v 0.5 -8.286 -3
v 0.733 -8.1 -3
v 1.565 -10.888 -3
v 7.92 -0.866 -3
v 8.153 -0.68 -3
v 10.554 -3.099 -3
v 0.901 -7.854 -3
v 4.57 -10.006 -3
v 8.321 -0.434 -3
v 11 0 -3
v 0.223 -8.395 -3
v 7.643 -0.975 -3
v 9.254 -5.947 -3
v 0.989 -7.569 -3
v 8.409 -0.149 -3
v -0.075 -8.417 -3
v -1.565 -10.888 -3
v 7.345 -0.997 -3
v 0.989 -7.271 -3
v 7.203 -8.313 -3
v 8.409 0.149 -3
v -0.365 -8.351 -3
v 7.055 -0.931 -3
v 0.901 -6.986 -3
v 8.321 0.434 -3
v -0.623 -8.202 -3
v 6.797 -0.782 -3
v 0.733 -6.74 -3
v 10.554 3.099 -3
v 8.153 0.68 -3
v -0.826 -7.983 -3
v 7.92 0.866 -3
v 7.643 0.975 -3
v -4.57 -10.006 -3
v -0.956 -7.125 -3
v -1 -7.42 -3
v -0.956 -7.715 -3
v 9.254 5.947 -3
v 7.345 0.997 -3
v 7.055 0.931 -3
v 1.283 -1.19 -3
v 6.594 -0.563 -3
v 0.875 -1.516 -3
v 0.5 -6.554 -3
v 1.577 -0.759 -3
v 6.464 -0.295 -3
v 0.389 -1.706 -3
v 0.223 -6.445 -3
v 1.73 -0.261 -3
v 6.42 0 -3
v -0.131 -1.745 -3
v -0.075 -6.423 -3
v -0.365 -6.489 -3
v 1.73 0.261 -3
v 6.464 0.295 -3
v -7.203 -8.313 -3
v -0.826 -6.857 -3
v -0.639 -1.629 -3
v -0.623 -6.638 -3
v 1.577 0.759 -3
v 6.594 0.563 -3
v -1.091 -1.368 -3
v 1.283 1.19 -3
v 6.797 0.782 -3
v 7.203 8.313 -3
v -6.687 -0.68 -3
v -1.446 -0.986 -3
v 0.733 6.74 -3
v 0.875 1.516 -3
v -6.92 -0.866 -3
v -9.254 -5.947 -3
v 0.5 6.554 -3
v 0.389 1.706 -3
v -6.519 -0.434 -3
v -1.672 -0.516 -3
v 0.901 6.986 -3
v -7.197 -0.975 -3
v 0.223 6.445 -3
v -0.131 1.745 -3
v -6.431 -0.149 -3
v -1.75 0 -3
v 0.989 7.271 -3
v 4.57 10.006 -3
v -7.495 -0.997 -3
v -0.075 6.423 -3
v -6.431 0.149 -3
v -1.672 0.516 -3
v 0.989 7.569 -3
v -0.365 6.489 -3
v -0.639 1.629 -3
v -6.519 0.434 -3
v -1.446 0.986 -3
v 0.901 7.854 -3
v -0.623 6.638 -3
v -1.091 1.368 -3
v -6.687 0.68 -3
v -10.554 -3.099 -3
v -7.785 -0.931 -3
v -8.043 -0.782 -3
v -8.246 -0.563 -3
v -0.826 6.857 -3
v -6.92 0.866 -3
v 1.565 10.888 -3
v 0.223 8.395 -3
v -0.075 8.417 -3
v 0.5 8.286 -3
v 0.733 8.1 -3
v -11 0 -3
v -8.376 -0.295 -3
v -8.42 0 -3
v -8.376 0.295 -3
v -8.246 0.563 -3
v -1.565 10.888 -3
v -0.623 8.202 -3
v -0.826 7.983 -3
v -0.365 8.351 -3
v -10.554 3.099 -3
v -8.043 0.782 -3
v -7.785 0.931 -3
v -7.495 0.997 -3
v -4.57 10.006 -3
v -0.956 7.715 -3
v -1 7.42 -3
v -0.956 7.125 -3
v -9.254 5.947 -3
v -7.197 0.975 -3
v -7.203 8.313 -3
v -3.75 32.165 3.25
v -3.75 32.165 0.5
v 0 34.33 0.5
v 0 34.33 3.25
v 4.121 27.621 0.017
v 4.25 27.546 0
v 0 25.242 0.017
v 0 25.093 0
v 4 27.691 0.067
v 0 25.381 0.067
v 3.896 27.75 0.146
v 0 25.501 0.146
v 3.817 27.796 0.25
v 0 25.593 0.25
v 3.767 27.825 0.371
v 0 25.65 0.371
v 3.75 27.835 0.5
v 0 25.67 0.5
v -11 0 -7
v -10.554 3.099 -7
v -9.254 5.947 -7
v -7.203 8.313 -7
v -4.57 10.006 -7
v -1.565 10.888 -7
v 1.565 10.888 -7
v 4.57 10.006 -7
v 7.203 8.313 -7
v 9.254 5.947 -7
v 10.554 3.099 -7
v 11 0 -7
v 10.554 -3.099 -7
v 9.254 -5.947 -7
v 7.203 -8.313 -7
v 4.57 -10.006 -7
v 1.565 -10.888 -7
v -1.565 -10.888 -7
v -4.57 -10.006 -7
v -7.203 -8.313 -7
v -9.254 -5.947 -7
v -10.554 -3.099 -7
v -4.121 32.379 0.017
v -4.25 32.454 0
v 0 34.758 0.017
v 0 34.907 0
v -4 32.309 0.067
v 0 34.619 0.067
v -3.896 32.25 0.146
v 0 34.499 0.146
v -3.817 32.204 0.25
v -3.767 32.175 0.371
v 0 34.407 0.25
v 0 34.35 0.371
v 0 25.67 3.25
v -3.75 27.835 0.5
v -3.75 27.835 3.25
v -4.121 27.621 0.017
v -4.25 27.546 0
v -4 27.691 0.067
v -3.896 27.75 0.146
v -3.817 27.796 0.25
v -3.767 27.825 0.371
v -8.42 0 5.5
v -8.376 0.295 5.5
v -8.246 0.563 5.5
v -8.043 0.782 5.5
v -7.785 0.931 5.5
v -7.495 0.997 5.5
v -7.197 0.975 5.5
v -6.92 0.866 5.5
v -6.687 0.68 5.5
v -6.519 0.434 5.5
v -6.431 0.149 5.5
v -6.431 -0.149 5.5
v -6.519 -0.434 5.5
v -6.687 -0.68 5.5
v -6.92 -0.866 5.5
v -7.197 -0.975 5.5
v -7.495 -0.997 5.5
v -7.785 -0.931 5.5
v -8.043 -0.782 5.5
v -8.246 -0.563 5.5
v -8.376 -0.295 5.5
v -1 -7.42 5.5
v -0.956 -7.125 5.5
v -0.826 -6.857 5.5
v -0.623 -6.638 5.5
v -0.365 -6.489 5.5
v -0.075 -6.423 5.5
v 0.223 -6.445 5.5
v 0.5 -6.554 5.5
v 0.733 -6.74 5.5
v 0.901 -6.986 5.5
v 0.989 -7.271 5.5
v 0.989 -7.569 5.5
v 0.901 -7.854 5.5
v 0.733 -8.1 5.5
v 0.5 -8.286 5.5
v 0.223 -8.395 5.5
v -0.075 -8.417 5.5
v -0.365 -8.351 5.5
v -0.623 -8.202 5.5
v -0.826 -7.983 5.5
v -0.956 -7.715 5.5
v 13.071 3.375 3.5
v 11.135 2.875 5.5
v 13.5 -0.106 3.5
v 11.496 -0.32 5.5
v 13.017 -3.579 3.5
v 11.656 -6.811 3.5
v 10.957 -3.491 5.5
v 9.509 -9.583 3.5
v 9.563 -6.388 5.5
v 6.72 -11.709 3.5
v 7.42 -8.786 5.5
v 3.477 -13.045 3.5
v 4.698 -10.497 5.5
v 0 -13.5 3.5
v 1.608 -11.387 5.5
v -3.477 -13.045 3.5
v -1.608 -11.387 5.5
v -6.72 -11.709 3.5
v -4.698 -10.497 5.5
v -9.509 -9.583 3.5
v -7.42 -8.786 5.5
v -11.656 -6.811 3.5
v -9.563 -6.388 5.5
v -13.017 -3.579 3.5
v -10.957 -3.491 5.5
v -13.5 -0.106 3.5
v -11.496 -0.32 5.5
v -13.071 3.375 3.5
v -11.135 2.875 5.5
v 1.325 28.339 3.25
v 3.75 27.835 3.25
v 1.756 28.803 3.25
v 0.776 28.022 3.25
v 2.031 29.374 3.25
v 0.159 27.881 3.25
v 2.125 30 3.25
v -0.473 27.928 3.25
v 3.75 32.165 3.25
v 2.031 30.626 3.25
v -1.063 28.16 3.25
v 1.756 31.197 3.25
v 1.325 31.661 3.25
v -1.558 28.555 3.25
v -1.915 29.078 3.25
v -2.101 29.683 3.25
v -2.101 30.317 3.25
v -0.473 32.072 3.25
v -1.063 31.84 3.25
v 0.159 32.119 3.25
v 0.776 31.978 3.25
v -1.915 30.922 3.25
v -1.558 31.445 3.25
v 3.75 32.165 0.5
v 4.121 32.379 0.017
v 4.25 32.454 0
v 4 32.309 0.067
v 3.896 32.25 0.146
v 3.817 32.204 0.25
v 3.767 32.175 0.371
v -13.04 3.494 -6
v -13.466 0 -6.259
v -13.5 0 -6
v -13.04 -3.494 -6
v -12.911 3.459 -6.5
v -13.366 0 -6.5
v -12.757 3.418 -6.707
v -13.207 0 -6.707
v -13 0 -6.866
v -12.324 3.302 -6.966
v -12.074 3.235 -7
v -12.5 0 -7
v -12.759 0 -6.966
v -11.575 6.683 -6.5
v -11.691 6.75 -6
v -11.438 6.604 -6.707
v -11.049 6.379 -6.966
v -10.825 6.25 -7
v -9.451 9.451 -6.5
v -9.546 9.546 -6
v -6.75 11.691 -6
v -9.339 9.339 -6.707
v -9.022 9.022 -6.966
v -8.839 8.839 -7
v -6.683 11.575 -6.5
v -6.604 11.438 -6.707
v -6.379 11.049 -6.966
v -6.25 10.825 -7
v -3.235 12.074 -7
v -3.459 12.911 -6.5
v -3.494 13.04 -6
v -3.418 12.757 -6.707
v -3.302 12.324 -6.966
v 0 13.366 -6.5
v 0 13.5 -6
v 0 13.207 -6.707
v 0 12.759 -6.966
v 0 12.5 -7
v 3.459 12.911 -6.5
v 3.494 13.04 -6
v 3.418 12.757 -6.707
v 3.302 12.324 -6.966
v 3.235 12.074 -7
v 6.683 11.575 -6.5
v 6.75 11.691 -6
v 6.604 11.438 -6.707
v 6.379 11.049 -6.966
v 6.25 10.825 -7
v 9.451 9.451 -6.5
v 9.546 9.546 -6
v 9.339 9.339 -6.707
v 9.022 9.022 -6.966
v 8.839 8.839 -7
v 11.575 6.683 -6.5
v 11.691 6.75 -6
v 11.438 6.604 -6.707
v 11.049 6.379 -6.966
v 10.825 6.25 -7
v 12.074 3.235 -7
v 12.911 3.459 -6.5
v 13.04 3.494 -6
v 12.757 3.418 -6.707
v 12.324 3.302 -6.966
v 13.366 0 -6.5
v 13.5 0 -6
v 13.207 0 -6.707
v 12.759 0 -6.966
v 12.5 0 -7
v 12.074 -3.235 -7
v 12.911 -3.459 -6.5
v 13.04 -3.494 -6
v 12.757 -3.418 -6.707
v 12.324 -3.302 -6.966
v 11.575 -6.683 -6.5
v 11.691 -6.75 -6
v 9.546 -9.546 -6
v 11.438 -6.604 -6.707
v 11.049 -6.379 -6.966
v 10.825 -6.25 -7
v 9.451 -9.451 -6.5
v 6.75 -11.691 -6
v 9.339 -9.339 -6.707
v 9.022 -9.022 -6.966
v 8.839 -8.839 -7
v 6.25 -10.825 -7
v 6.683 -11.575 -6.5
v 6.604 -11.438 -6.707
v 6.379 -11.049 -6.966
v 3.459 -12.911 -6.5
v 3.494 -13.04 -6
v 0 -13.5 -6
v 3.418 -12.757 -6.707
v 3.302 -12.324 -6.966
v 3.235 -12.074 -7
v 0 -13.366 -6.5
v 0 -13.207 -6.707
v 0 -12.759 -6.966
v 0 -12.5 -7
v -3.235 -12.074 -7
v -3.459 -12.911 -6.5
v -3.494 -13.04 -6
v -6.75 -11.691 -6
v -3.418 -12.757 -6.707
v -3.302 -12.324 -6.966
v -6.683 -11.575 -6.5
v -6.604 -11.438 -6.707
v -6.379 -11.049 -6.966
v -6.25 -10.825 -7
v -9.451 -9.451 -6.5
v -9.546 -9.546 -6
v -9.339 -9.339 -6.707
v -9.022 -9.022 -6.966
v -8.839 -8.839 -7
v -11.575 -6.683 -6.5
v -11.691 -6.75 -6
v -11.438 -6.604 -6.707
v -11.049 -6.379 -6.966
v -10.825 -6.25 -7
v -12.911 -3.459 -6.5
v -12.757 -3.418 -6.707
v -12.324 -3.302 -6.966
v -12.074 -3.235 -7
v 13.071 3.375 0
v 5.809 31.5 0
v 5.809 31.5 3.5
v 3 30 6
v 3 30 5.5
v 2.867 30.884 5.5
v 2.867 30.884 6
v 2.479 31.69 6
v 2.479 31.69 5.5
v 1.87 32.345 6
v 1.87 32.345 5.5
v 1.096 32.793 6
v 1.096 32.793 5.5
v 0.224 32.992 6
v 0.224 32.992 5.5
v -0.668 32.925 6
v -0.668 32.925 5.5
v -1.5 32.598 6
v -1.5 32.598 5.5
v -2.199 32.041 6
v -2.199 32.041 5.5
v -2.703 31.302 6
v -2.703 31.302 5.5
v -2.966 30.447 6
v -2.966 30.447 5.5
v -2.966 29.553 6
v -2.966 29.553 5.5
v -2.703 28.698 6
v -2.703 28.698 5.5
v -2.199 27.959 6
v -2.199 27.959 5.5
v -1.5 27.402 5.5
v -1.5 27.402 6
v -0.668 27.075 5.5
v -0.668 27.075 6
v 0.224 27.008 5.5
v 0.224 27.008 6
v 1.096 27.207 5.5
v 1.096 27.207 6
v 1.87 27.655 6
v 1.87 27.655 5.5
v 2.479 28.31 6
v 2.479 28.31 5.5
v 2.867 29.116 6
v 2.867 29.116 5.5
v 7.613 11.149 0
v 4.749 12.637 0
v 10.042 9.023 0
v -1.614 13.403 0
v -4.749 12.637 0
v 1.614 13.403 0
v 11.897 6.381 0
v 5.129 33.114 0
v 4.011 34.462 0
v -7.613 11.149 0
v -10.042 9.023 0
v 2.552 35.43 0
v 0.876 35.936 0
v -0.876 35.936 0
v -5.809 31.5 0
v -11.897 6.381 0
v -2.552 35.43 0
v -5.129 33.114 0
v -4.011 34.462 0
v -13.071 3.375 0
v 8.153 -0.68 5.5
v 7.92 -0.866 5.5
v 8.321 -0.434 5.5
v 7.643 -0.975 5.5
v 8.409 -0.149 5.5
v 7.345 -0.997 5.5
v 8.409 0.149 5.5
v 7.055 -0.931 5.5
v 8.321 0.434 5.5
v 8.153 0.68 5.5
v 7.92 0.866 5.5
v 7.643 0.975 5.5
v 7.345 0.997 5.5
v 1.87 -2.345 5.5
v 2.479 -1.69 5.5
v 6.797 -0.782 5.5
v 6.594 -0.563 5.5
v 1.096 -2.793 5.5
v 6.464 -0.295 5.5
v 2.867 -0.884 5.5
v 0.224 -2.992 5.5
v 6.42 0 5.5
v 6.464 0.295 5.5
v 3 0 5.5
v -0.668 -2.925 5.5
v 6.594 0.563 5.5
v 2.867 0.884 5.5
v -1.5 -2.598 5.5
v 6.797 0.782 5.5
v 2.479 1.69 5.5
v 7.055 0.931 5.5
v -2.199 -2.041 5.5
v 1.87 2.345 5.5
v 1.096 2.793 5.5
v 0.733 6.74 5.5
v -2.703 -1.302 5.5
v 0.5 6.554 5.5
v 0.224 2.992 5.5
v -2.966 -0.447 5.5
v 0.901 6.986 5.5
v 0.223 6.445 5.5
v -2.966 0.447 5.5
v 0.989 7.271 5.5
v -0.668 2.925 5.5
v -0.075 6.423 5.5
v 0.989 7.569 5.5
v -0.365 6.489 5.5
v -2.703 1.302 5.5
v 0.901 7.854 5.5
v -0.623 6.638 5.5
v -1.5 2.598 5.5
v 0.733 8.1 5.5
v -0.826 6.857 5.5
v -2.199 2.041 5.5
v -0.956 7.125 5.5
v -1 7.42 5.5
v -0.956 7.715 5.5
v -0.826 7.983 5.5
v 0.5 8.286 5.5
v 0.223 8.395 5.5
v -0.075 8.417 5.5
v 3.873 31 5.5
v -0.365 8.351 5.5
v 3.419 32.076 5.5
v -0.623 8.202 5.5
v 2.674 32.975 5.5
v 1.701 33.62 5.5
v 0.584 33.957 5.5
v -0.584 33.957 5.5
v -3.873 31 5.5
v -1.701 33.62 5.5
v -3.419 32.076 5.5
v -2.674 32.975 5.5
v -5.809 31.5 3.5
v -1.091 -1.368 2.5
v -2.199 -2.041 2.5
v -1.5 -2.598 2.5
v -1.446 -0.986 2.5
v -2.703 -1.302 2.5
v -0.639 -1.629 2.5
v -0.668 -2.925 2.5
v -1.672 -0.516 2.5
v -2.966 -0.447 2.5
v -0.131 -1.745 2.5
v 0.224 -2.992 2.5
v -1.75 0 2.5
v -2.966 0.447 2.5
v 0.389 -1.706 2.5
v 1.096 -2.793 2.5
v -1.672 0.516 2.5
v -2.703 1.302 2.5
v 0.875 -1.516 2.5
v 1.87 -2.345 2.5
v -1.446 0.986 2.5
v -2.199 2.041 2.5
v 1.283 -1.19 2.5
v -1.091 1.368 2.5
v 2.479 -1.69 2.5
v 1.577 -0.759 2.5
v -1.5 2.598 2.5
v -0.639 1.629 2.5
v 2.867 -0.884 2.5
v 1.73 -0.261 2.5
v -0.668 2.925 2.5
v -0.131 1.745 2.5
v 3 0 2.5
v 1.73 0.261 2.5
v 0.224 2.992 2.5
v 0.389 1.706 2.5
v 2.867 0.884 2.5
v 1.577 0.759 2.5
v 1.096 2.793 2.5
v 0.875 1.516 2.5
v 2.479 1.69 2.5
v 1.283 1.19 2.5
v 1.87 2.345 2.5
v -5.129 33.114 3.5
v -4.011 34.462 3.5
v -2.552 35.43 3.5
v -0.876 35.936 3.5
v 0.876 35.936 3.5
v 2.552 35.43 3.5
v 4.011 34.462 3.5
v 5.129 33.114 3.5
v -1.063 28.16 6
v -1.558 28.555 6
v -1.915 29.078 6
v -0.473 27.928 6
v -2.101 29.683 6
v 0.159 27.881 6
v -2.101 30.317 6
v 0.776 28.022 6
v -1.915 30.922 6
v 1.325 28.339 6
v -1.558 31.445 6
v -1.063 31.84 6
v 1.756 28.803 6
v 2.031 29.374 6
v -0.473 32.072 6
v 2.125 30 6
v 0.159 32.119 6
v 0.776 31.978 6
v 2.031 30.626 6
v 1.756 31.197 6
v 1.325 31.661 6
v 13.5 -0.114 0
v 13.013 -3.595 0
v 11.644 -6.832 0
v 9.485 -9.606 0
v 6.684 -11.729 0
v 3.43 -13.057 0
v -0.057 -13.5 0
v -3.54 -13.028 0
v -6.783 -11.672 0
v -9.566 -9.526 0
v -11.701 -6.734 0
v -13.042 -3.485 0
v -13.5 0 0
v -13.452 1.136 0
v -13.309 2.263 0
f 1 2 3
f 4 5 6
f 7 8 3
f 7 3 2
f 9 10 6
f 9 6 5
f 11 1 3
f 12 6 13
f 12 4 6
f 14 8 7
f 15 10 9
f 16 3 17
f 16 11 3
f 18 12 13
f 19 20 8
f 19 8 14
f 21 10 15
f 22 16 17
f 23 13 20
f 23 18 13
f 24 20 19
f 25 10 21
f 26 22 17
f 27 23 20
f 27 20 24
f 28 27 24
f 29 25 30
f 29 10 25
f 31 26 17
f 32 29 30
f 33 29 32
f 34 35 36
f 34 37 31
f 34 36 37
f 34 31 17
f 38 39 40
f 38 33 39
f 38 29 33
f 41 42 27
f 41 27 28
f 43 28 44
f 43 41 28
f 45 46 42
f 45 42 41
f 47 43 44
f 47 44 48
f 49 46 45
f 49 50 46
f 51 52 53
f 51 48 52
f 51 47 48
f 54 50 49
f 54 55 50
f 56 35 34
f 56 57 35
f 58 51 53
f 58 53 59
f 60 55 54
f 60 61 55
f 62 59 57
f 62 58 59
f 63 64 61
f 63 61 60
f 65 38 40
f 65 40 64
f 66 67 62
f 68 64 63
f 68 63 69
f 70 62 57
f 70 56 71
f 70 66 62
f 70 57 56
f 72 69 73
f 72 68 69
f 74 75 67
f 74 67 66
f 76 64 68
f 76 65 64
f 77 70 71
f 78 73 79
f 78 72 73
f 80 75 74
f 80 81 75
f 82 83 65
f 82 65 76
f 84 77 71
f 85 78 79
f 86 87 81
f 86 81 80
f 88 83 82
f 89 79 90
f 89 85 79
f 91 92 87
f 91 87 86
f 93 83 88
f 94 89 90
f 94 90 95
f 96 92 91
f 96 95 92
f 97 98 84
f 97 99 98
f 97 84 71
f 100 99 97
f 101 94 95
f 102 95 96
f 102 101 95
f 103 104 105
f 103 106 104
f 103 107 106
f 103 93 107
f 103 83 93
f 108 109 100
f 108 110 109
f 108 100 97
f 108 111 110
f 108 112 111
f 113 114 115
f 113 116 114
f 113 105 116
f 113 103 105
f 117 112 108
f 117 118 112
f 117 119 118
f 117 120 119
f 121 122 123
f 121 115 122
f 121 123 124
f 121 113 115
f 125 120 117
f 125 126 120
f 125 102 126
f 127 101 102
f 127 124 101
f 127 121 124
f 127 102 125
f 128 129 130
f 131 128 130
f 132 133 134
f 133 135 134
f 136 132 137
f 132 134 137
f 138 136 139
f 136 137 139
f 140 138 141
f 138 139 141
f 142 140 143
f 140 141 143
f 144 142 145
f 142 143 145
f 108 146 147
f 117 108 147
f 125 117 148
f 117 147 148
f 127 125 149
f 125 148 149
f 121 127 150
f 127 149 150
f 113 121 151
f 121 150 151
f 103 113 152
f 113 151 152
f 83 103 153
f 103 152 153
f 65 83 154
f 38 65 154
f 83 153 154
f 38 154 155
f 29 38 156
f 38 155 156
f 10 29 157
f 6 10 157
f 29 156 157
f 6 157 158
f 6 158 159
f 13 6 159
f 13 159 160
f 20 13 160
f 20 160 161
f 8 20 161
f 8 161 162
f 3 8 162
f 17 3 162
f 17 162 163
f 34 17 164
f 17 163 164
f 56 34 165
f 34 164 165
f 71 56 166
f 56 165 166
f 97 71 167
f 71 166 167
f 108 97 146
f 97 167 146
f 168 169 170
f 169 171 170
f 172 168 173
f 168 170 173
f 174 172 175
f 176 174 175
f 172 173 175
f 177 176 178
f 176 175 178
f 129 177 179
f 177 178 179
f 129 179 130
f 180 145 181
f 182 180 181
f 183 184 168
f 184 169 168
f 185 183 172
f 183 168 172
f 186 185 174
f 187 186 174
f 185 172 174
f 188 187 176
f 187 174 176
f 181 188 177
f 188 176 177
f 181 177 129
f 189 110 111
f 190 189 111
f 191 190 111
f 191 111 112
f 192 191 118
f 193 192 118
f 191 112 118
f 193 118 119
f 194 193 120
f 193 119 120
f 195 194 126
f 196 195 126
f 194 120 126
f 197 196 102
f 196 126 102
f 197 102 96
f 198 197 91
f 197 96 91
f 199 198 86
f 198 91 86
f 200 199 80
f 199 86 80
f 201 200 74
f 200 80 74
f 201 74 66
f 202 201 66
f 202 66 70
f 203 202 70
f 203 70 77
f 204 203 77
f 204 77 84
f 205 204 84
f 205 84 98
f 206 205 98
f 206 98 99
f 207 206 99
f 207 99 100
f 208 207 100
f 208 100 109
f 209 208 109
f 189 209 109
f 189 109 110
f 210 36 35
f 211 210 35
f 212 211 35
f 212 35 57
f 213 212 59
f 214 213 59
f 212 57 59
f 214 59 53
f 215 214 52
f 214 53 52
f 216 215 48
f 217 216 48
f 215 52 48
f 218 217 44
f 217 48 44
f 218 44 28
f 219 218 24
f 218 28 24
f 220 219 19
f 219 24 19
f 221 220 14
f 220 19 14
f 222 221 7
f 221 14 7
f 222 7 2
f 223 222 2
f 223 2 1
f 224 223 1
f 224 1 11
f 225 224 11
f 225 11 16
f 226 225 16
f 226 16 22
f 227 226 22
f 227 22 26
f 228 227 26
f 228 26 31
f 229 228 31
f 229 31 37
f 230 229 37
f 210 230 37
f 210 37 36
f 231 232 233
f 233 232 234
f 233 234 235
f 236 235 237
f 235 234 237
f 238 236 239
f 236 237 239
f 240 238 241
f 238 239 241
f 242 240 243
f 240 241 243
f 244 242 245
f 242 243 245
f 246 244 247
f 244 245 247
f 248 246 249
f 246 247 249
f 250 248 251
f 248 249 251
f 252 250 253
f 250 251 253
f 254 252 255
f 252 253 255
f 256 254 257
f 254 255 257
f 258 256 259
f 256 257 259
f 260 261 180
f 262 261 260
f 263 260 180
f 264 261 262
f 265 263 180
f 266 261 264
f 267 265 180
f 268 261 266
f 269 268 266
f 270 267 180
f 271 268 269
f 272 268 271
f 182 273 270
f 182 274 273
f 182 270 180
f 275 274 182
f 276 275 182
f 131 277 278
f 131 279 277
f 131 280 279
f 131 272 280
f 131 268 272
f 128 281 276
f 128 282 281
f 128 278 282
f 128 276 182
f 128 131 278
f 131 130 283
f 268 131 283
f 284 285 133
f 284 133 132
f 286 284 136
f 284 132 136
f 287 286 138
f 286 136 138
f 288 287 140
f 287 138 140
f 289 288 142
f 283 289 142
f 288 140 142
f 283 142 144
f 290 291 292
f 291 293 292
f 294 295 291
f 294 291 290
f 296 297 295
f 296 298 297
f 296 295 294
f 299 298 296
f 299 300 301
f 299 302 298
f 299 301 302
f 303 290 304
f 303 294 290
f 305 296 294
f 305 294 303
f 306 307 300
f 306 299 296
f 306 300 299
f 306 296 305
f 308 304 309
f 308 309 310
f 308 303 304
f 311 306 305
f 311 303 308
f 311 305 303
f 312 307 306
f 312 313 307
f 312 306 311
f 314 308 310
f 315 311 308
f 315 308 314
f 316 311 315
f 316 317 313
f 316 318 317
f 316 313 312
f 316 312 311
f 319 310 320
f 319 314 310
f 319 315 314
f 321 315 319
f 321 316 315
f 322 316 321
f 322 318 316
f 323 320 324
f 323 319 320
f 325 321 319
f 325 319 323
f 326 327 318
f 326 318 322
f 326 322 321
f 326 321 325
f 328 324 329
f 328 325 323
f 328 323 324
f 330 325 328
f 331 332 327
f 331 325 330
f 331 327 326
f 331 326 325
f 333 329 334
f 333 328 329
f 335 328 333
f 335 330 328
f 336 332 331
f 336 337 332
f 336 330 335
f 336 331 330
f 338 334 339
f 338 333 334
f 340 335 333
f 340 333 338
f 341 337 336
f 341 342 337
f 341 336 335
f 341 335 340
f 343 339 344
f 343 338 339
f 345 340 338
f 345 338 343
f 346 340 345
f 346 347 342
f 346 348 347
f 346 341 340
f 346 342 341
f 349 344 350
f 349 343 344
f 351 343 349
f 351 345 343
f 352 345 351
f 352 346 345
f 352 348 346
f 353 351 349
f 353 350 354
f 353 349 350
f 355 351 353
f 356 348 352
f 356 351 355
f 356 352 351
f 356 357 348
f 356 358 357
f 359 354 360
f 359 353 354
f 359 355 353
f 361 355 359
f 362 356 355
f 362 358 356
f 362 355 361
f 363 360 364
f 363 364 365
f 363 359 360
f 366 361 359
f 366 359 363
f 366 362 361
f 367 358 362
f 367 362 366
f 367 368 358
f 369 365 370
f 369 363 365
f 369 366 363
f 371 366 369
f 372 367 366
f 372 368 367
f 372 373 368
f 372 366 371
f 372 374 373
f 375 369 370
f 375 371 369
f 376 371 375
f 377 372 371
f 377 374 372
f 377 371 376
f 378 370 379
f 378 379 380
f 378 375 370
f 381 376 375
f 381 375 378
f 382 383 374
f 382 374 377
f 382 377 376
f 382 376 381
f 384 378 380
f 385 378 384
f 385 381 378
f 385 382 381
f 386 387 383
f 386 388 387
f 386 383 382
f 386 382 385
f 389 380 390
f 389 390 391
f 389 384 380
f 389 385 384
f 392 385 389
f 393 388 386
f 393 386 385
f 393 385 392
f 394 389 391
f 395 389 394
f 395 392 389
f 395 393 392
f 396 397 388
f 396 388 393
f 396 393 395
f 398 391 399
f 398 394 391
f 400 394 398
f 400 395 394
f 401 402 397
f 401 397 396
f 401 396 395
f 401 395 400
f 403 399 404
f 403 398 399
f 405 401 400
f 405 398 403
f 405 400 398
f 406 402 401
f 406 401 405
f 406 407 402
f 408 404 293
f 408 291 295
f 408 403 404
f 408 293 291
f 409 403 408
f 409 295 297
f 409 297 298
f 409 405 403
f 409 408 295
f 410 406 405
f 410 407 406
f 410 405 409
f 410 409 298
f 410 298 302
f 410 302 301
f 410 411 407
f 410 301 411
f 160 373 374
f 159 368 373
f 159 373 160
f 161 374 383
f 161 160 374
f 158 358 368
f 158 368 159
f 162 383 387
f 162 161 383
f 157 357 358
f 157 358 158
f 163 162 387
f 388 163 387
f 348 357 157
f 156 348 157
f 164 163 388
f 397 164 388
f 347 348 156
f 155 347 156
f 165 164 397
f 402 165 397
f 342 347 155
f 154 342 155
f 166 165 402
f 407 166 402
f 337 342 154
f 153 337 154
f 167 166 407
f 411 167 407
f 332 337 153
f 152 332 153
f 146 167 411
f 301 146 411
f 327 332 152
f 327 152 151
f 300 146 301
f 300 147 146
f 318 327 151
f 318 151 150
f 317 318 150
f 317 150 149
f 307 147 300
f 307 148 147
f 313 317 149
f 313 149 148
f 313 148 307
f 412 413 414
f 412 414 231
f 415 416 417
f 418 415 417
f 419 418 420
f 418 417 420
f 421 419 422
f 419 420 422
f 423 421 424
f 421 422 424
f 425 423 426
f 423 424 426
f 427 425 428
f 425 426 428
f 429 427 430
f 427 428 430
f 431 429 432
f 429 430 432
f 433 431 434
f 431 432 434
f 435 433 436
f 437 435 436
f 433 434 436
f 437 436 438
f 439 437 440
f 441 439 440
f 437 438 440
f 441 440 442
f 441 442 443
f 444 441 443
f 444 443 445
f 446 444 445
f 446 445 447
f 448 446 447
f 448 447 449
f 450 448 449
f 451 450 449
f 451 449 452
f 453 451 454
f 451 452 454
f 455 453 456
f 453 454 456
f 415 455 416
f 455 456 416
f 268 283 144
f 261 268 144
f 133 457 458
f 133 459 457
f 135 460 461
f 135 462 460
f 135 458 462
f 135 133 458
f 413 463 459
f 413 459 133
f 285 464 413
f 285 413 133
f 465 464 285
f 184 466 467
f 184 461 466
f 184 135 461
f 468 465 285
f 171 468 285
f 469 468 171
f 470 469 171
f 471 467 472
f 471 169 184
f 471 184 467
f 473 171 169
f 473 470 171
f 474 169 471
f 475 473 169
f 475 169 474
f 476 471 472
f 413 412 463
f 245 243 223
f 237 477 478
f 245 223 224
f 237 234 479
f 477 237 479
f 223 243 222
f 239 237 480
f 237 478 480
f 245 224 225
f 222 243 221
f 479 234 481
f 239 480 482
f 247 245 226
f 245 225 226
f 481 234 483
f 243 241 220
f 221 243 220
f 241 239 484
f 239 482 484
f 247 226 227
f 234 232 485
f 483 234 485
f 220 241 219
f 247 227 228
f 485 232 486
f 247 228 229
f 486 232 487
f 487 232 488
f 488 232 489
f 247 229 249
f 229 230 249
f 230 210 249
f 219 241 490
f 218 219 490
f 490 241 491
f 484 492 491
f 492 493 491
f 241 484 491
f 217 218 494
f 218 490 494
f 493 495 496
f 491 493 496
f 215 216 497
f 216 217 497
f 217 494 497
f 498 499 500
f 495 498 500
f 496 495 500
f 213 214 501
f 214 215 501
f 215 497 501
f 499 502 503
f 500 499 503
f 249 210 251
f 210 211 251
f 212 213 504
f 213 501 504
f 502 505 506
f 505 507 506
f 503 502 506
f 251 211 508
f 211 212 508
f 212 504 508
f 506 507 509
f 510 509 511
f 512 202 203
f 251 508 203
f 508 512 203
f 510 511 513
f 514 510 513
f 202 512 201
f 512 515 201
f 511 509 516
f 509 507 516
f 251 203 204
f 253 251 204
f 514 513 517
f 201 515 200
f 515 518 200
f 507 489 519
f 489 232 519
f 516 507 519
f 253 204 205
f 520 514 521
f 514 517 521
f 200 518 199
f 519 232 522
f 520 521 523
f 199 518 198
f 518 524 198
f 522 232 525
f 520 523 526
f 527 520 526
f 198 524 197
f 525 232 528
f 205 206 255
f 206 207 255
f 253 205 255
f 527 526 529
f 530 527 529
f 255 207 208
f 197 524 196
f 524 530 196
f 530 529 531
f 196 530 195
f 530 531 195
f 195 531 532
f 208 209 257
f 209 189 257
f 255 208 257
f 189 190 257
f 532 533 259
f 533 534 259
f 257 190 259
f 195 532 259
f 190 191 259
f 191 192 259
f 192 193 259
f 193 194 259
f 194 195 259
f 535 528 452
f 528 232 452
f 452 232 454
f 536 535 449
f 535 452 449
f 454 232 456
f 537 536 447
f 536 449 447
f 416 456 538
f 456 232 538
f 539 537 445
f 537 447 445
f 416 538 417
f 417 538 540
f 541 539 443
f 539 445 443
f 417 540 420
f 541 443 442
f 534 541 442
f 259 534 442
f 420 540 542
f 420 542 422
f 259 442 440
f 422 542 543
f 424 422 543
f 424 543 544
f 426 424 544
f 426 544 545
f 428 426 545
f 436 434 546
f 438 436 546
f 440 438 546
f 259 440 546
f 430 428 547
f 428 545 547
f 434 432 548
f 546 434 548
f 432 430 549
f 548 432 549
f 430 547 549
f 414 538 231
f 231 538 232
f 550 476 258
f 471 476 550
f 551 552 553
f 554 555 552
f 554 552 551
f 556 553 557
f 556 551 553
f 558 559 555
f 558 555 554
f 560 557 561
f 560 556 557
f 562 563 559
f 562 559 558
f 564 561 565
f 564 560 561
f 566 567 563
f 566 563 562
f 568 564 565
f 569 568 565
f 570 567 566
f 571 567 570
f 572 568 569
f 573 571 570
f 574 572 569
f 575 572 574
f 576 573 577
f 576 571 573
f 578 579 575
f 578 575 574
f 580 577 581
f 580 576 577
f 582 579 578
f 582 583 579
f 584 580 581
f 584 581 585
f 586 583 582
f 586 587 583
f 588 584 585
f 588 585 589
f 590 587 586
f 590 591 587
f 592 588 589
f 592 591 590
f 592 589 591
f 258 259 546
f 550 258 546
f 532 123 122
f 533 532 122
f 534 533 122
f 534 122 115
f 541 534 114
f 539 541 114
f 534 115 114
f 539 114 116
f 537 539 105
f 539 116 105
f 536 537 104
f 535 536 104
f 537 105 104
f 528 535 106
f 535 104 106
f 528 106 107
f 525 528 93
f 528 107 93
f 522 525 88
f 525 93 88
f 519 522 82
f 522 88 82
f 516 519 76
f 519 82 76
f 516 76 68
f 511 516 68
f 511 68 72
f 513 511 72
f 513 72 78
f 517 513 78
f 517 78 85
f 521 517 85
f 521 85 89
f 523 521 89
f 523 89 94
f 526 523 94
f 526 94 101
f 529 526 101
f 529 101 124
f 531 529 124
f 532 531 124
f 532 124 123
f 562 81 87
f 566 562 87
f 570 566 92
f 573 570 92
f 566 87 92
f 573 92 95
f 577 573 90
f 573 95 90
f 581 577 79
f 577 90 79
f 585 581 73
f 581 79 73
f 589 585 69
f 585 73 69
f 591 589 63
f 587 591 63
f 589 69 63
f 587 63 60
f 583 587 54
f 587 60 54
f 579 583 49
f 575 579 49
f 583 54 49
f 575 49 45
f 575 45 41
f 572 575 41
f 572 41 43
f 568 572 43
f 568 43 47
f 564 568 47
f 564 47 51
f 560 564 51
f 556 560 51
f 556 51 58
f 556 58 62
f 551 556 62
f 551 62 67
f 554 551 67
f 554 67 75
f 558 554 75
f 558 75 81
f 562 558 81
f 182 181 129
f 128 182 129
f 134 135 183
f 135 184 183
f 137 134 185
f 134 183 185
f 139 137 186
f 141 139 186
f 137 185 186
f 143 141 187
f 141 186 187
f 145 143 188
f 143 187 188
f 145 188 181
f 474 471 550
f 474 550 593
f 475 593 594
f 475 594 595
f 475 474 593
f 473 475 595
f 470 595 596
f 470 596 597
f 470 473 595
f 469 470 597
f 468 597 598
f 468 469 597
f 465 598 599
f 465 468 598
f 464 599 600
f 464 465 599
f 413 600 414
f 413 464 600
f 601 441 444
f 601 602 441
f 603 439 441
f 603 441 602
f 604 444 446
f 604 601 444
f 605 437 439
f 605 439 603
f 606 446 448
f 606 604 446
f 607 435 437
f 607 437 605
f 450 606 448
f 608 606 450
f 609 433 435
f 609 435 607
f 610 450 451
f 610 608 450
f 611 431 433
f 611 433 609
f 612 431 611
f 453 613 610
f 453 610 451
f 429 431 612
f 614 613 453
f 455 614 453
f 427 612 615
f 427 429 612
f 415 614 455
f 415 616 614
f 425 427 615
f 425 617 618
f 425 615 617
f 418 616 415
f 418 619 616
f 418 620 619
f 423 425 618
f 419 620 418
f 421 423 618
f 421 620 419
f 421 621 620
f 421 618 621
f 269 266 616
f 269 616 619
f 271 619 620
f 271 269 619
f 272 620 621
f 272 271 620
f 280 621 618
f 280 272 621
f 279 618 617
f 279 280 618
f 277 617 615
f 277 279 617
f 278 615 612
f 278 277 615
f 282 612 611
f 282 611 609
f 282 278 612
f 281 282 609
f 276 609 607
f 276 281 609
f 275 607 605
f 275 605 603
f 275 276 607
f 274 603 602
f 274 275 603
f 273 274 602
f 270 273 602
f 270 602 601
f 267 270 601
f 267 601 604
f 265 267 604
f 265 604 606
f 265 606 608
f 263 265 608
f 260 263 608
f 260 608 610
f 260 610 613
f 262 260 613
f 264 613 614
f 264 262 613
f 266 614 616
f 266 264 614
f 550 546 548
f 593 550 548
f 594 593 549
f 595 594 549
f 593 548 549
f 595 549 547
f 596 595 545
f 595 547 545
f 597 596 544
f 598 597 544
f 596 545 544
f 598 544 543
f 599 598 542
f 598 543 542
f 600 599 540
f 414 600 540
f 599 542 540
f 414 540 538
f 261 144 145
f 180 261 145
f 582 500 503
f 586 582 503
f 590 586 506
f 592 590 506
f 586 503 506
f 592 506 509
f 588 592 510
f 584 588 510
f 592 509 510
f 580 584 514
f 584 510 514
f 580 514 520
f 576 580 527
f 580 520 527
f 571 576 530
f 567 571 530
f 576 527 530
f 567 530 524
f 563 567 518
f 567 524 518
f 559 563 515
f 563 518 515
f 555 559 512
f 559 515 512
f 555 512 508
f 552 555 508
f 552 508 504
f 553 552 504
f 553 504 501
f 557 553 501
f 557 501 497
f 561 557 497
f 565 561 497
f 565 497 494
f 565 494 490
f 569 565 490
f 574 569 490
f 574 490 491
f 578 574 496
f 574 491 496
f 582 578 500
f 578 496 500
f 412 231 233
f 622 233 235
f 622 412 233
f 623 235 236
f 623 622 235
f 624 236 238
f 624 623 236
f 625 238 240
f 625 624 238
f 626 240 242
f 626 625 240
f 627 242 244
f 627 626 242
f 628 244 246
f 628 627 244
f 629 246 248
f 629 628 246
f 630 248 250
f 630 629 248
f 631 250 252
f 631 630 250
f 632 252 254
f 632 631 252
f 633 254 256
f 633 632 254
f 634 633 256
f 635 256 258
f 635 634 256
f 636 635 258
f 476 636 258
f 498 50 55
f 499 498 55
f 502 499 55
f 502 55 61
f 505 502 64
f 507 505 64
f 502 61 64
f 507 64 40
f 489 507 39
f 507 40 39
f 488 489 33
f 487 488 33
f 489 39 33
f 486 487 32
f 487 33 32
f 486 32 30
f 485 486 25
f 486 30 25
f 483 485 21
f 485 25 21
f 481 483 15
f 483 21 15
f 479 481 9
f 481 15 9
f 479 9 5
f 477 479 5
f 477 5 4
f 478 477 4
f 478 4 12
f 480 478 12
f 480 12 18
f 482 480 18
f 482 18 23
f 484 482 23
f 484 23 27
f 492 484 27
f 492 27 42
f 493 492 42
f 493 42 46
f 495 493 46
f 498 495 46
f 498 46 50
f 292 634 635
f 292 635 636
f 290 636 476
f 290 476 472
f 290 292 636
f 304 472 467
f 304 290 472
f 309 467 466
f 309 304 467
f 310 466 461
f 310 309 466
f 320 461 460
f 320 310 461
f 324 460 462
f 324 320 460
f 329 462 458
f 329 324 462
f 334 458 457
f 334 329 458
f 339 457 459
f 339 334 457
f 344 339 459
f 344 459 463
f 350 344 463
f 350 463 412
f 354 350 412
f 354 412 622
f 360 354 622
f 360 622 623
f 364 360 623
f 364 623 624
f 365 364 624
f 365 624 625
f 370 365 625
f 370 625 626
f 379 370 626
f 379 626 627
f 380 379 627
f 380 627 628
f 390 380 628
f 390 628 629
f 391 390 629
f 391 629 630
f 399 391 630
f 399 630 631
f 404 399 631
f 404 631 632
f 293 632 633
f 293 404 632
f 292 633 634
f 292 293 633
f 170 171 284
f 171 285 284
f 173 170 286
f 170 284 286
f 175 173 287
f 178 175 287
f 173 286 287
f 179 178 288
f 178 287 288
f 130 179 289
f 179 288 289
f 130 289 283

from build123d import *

# Parameters (mm, degrees)
SKETCH1_R           = 2.125
BOSS_EXTRUDE1_DEPTH = 5.5
BOSS_EXTRUDE2_START = 7
SKETCH4_R           = 13.5
BOSS_EXTRUDE2_DEPTH = 7
SKETCH6_R           = 11
CUT_EXTRUDE4_DEPTH  = 4
SKETCH5_R           = 1
SKETCH5_R_2         = 1.75
CUT_EXTRUDE2_DEPTH  = 40.376388864
CHAMFER1_SIZE       = 2
SKETCH7_R           = 3
CUT_EXTRUDE5_DEPTH  = 3
FILLET1_R           = 1
SKETCH8_R           = 3
SKETCH8_R_2         = 2.125
BOSS_EXTRUDE3_DEPTH = 0.5
CUT_EXTRUDE6_DEPTH  = 3.25
FILLET2_R           = 0.5


with BuildPart() as part:
    # Sketch1 → Boss-Extrude1 (new body)
    with BuildSketch(Plane.XY):
        with BuildLine():
            Line((-5.809475019, 31.5), (-13.071318793, 3.375))
            ThreePointArc((-13.071318793, 3.375), (0, -13.5), (13.071318793, 3.375))
            Line((13.071318793, 3.375), (5.809475019, 31.5))
            ThreePointArc((5.809475019, 31.5), (0, 36), (-5.809475019, 31.5))
        make_face()
        with Locations((0, 30)):
            Circle(SKETCH1_R, mode=Mode.SUBTRACT)
    extrude(amount=BOSS_EXTRUDE1_DEPTH)

    # Sketch4 → Boss-Extrude2 (add)
    with BuildSketch(Plane(origin=(0, 0, 0), x_dir=(-1, 0, 0), z_dir=(0, 0, -1)).offset(BOSS_EXTRUDE2_START)):
        Circle(SKETCH4_R)
    extrude(amount=-BOSS_EXTRUDE2_DEPTH)

    # Sketch6 → Cut-Extrude4 (cut)
    with BuildSketch(Plane(origin=(0, 0, -7), x_dir=(-1, 0, 0), z_dir=(0, 0, -1))):
        Circle(SKETCH6_R)
    extrude(amount=-CUT_EXTRUDE4_DEPTH, mode=Mode.SUBTRACT)

    # Sketch5 → Cut-Extrude2 (cut, through all)
    with BuildSketch(Plane(origin=(0, 0, -3), x_dir=(-1, 0, 0), z_dir=(0, 0, -1))):
        with Locations((7.42, 0)):
            Circle(SKETCH5_R)
        with Locations((0, -7.42)):
            Circle(SKETCH5_R)
        with Locations((-7.42, 0)):
            Circle(SKETCH5_R)
        with Locations((0, 7.42)):
            Circle(SKETCH5_R)
        Circle(SKETCH5_R_2)
    extrude(amount=-CUT_EXTRUDE2_DEPTH, mode=Mode.SUBTRACT)

    # Chamfer1
    chamfer1_edges = [part.edges().sort_by_distance(p)[0] for p in [
        (0, -13.5, 5.5),
        (-9.440396906, 17.4375, 5.5),
        (0, 36, 5.5),
        (9.440396906, 17.4375, 5.5),
    ]]
    chamfer(chamfer1_edges, length=CHAMFER1_SIZE)

    # Sketch7 → Cut-Extrude5 (cut)
    with BuildSketch(Plane.XY.offset(5.5)):
        Circle(SKETCH7_R)
    extrude(amount=-CUT_EXTRUDE5_DEPTH, mode=Mode.SUBTRACT)

    # Fillet1
    fillet1_edges = [part.edges().sort_by_distance(p)[0] for p in [
        (13.5, 0, -7),
    ]]
    fillet(fillet1_edges, radius=FILLET1_R)

    # Sketch8 → Boss-Extrude3 (add)
    with BuildSketch(Plane.XY.offset(5.5)):
        with Locations((0, 30)):
            Circle(SKETCH8_R)
        with Locations((0, 30)):
            Circle(SKETCH8_R_2, mode=Mode.SUBTRACT)
    extrude(amount=BOSS_EXTRUDE3_DEPTH)

    # Sketch9 → Cut-Extrude6 (cut)
    with BuildSketch(Plane(origin=(0, 0, 0), x_dir=(-1, 0, 0), z_dir=(0, 0, -1))):
        Polygon((0, 25.669872981), (3.75, 27.834936491), (3.75, 32.165063509), (0, 34.330127019), (-3.75, 32.165063509), (-3.75, 27.834936491), align=None)
    extrude(amount=-CUT_EXTRUDE6_DEPTH, mode=Mode.SUBTRACT)

    # Fillet2
    fillet2_edges = [part.edges().sort_by_distance(p)[0] for p in [
        (3.75, 30, 0),
        (1.875, 26.752404736, 0),
        (-1.875, 26.752404736, 0),
        (-3.75, 30, 0),
        (-1.875, 33.247595264, 0),
        (1.875, 33.247595264, 0),
    ]]
    fillet(fillet2_edges, radius=FILLET2_R)


solid = part.part
